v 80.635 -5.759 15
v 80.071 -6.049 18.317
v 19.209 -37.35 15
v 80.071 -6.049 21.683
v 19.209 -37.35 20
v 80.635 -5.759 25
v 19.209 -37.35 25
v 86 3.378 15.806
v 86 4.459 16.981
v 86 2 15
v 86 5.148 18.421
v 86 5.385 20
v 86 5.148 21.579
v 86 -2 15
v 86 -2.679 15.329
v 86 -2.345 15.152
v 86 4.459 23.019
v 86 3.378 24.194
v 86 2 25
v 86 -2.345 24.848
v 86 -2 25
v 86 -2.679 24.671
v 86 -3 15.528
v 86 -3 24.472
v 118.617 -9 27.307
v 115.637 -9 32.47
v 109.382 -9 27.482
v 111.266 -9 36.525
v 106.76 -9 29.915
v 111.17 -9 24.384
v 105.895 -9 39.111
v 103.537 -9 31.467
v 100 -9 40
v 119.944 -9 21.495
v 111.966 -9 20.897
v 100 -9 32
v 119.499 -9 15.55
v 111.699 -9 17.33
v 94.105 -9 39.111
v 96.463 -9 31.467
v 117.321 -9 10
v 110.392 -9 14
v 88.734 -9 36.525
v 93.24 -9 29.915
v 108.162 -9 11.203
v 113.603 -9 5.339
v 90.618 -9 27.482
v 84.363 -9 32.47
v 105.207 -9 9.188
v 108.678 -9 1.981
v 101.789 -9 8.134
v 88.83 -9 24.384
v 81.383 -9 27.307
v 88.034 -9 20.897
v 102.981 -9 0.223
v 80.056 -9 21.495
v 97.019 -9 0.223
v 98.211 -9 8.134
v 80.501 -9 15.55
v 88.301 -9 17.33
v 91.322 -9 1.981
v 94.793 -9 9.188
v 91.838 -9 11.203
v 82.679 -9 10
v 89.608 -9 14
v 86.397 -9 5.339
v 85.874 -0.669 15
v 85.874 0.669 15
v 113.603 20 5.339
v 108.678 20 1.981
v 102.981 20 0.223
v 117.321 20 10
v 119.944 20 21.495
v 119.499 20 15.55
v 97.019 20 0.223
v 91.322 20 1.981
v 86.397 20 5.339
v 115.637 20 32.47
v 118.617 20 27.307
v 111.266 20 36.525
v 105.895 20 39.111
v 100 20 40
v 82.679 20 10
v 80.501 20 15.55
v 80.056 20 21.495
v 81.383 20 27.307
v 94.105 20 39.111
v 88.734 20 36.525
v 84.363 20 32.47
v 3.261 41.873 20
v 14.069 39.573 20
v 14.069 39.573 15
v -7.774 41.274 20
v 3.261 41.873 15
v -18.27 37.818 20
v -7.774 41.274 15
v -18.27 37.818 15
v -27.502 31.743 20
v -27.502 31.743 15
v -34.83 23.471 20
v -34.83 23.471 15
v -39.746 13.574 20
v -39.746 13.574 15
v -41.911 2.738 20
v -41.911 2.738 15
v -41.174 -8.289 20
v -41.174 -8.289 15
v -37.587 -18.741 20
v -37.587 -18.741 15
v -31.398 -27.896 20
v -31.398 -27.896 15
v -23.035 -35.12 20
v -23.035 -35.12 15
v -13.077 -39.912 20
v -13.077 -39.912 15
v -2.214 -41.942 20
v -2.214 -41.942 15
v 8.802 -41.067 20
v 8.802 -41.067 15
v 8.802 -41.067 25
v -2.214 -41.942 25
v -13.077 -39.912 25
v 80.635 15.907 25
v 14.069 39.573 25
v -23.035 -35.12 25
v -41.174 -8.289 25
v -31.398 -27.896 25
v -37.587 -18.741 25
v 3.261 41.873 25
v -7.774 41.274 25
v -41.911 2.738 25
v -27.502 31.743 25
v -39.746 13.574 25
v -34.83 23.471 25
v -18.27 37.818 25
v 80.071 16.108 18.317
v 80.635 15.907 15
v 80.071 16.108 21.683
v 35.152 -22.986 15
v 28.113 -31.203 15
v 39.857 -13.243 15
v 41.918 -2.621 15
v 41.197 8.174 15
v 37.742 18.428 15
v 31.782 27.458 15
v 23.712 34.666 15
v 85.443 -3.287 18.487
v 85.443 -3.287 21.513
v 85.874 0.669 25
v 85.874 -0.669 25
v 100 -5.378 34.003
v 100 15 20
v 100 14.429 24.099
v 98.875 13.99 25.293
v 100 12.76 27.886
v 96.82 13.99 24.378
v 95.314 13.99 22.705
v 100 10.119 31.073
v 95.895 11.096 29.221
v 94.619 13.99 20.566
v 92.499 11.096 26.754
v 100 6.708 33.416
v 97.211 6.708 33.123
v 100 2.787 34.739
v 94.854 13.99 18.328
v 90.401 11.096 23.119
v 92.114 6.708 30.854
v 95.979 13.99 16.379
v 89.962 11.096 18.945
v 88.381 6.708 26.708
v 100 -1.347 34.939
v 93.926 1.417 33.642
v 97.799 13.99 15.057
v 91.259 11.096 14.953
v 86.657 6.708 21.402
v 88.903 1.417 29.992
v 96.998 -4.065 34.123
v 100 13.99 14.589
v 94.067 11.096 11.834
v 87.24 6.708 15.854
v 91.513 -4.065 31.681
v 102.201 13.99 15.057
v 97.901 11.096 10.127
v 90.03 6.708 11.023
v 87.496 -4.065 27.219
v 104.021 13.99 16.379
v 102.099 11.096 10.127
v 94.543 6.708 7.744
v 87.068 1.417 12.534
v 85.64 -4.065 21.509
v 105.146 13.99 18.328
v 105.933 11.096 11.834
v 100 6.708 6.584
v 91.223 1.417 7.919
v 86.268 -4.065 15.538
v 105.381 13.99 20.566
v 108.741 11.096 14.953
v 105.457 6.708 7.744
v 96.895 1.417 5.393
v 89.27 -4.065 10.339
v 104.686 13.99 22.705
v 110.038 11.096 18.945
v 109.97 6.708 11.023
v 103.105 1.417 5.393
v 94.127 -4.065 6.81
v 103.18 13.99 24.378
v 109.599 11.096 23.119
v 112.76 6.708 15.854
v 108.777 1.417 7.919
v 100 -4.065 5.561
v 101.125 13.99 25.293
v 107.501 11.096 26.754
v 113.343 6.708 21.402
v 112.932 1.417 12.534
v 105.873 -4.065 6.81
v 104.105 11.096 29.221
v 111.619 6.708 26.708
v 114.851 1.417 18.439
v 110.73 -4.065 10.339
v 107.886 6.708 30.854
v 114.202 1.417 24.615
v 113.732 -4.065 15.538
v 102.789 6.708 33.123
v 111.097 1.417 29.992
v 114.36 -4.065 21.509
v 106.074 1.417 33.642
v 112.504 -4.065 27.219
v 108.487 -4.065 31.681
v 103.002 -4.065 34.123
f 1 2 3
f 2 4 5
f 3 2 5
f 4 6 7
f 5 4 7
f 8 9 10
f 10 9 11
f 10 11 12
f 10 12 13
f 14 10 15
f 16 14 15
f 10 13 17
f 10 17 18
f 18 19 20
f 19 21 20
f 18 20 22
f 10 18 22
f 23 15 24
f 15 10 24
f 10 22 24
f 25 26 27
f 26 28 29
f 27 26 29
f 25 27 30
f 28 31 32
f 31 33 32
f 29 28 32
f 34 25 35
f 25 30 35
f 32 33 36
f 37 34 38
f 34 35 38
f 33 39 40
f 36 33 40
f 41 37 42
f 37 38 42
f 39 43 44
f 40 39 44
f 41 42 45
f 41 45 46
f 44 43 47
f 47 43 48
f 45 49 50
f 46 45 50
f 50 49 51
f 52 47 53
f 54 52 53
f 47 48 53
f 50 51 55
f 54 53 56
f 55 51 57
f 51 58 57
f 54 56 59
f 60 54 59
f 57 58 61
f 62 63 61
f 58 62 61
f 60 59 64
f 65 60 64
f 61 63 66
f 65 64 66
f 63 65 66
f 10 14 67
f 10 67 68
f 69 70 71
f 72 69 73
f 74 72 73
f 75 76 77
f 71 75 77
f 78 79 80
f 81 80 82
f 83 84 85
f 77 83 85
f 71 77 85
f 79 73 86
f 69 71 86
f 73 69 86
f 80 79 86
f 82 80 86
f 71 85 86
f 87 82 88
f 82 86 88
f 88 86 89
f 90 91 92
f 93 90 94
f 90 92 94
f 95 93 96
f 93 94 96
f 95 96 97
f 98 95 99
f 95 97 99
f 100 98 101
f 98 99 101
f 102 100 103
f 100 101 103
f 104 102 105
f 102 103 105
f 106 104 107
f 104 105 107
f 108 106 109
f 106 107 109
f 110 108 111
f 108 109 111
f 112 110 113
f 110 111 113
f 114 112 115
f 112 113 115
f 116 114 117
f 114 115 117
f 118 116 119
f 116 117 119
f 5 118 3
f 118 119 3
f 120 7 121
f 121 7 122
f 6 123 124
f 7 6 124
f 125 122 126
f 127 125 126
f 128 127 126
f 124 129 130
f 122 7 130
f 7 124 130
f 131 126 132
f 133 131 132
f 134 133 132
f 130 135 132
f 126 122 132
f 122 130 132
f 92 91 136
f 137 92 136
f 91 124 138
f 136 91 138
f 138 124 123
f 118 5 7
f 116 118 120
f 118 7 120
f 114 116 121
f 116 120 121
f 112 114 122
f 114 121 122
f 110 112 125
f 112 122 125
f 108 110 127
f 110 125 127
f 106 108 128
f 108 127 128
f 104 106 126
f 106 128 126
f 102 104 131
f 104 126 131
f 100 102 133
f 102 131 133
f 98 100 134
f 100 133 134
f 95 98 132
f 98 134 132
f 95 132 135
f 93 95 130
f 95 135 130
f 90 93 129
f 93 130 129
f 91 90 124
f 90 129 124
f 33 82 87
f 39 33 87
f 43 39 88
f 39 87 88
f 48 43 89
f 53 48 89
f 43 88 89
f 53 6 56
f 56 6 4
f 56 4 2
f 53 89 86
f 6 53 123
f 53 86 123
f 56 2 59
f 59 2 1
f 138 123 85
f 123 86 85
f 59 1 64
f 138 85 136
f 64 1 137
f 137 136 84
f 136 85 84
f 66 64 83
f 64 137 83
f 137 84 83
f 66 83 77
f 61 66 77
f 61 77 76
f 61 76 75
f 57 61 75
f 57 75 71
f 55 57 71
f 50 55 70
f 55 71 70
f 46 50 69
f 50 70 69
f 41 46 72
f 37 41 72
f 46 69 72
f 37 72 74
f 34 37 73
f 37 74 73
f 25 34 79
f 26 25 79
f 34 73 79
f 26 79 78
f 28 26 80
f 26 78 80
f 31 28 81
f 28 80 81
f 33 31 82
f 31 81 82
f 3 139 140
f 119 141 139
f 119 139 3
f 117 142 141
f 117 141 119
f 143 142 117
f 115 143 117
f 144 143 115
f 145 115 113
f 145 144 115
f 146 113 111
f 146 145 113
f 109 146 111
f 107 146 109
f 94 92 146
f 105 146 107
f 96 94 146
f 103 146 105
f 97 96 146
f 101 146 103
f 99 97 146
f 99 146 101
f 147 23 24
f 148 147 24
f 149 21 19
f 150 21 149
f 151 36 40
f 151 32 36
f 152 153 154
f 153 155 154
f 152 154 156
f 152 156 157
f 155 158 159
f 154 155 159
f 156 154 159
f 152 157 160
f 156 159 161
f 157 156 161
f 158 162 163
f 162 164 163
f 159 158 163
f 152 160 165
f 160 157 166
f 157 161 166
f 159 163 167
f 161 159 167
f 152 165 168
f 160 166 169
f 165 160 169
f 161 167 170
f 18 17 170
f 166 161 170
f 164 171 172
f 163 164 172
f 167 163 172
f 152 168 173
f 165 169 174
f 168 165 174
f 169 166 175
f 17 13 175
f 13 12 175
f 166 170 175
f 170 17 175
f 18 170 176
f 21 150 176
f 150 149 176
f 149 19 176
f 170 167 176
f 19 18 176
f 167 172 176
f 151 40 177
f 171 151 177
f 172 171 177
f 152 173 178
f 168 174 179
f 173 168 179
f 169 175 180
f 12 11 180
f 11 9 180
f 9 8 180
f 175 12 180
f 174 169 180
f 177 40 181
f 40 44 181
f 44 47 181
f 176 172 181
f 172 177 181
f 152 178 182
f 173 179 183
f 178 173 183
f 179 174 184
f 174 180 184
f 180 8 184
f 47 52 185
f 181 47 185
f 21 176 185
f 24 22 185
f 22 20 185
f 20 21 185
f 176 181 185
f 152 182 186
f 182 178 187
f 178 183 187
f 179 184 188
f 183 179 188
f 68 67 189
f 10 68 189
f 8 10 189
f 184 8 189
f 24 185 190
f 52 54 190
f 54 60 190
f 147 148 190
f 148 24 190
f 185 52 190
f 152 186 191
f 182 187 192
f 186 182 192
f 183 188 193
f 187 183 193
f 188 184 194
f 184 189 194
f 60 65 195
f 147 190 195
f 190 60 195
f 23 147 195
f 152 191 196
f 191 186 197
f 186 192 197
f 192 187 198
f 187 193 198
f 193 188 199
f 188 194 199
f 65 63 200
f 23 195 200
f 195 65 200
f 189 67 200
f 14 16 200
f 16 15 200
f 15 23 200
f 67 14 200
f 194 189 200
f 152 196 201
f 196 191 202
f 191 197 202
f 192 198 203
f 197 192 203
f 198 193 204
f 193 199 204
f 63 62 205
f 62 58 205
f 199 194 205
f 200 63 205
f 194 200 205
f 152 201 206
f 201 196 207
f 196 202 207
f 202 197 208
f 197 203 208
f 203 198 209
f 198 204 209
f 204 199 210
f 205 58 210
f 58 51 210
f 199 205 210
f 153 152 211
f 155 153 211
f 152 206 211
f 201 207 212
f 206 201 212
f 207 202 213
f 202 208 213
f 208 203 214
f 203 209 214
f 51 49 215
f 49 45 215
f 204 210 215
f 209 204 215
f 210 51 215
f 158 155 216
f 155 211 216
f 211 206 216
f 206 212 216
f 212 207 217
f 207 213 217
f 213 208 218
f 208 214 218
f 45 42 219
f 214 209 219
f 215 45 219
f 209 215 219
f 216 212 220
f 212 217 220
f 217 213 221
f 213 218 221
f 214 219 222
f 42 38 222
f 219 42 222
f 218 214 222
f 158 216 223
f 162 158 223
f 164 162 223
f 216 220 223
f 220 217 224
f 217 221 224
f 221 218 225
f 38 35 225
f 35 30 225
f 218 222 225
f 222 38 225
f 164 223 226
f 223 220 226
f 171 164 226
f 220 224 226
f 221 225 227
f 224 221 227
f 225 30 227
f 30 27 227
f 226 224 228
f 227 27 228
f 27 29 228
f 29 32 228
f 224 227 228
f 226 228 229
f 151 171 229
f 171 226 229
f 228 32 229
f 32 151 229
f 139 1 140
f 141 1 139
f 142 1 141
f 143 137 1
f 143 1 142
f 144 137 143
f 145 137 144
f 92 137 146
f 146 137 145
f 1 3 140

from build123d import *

# Parameters (mm, degrees)
SKETCH_1_R          = 42
EXTRUDE_1_DEPTH     = 20
EXTRUDE_2_DEPTH     = 5
SKETCH_4_R          = 42
CUT_EXTRUDE_1_DEPTH = 15


with BuildPart() as part:
    # 草图1 → 凸台-拉伸1 (new body)
    with BuildSketch(Plane.XY):
        Circle(SKETCH_1_R)
    extrude(amount=EXTRUDE_1_DEPTH)



with BuildPart() as body_2:
    # 草图2 → 旋转1 (revolve)
    with BuildSketch(Plane.XY.offset(20), mode=Mode.PRIVATE) as revolve_1_sk:
        with BuildLine():
            Line((100, 20), (100, 15))
            ThreePointArc((100, 15), (86.583592135, 6.708203932), (88, -9))
            Line((88, -9), (80, -9))
            Line((80, -9), (80, 20))
            Line((80, 20), (100, 20))
        make_face()
    revolve(revolve_1_sk.sketch.rotate(Axis((100, 22.717290725, 20), (0, -1, 0)), 270), axis=Axis((100, 22.717290725, 20), (0, -1, 0)))


with BuildPart() as part_1:
    add(part.part)

    add(body_2.part)  # 凸台-拉伸2 merges body 2
    # 草图3 → 凸台-拉伸2 (add, symmetric)
    with BuildSketch(Plane.XY.offset(20)):
        with BuildLine():
            Line((14.069453744, 39.573355574), (86, 14))
            Line((86, 14), (86, -3))
            Line((86, -3), (19.208719722, -37.350034627))
            ThreePointArc((19.208719722, -37.350034627), (-41.906577017, -2.79978619), (14.069453744, 39.573355574))
        make_face()
    extrude(amount=EXTRUDE_2_DEPTH, both=True)

    # 草图4 → 切除-拉伸1 (cut)
    with BuildSketch(Plane(origin=(0, 0, 0), x_dir=(-1, 0, 0), z_dir=(0, 0, -1))):
        Circle(SKETCH_4_R)
    extrude(amount=-CUT_EXTRUDE_1_DEPTH, mode=Mode.SUBTRACT)


solid = part_1.part
